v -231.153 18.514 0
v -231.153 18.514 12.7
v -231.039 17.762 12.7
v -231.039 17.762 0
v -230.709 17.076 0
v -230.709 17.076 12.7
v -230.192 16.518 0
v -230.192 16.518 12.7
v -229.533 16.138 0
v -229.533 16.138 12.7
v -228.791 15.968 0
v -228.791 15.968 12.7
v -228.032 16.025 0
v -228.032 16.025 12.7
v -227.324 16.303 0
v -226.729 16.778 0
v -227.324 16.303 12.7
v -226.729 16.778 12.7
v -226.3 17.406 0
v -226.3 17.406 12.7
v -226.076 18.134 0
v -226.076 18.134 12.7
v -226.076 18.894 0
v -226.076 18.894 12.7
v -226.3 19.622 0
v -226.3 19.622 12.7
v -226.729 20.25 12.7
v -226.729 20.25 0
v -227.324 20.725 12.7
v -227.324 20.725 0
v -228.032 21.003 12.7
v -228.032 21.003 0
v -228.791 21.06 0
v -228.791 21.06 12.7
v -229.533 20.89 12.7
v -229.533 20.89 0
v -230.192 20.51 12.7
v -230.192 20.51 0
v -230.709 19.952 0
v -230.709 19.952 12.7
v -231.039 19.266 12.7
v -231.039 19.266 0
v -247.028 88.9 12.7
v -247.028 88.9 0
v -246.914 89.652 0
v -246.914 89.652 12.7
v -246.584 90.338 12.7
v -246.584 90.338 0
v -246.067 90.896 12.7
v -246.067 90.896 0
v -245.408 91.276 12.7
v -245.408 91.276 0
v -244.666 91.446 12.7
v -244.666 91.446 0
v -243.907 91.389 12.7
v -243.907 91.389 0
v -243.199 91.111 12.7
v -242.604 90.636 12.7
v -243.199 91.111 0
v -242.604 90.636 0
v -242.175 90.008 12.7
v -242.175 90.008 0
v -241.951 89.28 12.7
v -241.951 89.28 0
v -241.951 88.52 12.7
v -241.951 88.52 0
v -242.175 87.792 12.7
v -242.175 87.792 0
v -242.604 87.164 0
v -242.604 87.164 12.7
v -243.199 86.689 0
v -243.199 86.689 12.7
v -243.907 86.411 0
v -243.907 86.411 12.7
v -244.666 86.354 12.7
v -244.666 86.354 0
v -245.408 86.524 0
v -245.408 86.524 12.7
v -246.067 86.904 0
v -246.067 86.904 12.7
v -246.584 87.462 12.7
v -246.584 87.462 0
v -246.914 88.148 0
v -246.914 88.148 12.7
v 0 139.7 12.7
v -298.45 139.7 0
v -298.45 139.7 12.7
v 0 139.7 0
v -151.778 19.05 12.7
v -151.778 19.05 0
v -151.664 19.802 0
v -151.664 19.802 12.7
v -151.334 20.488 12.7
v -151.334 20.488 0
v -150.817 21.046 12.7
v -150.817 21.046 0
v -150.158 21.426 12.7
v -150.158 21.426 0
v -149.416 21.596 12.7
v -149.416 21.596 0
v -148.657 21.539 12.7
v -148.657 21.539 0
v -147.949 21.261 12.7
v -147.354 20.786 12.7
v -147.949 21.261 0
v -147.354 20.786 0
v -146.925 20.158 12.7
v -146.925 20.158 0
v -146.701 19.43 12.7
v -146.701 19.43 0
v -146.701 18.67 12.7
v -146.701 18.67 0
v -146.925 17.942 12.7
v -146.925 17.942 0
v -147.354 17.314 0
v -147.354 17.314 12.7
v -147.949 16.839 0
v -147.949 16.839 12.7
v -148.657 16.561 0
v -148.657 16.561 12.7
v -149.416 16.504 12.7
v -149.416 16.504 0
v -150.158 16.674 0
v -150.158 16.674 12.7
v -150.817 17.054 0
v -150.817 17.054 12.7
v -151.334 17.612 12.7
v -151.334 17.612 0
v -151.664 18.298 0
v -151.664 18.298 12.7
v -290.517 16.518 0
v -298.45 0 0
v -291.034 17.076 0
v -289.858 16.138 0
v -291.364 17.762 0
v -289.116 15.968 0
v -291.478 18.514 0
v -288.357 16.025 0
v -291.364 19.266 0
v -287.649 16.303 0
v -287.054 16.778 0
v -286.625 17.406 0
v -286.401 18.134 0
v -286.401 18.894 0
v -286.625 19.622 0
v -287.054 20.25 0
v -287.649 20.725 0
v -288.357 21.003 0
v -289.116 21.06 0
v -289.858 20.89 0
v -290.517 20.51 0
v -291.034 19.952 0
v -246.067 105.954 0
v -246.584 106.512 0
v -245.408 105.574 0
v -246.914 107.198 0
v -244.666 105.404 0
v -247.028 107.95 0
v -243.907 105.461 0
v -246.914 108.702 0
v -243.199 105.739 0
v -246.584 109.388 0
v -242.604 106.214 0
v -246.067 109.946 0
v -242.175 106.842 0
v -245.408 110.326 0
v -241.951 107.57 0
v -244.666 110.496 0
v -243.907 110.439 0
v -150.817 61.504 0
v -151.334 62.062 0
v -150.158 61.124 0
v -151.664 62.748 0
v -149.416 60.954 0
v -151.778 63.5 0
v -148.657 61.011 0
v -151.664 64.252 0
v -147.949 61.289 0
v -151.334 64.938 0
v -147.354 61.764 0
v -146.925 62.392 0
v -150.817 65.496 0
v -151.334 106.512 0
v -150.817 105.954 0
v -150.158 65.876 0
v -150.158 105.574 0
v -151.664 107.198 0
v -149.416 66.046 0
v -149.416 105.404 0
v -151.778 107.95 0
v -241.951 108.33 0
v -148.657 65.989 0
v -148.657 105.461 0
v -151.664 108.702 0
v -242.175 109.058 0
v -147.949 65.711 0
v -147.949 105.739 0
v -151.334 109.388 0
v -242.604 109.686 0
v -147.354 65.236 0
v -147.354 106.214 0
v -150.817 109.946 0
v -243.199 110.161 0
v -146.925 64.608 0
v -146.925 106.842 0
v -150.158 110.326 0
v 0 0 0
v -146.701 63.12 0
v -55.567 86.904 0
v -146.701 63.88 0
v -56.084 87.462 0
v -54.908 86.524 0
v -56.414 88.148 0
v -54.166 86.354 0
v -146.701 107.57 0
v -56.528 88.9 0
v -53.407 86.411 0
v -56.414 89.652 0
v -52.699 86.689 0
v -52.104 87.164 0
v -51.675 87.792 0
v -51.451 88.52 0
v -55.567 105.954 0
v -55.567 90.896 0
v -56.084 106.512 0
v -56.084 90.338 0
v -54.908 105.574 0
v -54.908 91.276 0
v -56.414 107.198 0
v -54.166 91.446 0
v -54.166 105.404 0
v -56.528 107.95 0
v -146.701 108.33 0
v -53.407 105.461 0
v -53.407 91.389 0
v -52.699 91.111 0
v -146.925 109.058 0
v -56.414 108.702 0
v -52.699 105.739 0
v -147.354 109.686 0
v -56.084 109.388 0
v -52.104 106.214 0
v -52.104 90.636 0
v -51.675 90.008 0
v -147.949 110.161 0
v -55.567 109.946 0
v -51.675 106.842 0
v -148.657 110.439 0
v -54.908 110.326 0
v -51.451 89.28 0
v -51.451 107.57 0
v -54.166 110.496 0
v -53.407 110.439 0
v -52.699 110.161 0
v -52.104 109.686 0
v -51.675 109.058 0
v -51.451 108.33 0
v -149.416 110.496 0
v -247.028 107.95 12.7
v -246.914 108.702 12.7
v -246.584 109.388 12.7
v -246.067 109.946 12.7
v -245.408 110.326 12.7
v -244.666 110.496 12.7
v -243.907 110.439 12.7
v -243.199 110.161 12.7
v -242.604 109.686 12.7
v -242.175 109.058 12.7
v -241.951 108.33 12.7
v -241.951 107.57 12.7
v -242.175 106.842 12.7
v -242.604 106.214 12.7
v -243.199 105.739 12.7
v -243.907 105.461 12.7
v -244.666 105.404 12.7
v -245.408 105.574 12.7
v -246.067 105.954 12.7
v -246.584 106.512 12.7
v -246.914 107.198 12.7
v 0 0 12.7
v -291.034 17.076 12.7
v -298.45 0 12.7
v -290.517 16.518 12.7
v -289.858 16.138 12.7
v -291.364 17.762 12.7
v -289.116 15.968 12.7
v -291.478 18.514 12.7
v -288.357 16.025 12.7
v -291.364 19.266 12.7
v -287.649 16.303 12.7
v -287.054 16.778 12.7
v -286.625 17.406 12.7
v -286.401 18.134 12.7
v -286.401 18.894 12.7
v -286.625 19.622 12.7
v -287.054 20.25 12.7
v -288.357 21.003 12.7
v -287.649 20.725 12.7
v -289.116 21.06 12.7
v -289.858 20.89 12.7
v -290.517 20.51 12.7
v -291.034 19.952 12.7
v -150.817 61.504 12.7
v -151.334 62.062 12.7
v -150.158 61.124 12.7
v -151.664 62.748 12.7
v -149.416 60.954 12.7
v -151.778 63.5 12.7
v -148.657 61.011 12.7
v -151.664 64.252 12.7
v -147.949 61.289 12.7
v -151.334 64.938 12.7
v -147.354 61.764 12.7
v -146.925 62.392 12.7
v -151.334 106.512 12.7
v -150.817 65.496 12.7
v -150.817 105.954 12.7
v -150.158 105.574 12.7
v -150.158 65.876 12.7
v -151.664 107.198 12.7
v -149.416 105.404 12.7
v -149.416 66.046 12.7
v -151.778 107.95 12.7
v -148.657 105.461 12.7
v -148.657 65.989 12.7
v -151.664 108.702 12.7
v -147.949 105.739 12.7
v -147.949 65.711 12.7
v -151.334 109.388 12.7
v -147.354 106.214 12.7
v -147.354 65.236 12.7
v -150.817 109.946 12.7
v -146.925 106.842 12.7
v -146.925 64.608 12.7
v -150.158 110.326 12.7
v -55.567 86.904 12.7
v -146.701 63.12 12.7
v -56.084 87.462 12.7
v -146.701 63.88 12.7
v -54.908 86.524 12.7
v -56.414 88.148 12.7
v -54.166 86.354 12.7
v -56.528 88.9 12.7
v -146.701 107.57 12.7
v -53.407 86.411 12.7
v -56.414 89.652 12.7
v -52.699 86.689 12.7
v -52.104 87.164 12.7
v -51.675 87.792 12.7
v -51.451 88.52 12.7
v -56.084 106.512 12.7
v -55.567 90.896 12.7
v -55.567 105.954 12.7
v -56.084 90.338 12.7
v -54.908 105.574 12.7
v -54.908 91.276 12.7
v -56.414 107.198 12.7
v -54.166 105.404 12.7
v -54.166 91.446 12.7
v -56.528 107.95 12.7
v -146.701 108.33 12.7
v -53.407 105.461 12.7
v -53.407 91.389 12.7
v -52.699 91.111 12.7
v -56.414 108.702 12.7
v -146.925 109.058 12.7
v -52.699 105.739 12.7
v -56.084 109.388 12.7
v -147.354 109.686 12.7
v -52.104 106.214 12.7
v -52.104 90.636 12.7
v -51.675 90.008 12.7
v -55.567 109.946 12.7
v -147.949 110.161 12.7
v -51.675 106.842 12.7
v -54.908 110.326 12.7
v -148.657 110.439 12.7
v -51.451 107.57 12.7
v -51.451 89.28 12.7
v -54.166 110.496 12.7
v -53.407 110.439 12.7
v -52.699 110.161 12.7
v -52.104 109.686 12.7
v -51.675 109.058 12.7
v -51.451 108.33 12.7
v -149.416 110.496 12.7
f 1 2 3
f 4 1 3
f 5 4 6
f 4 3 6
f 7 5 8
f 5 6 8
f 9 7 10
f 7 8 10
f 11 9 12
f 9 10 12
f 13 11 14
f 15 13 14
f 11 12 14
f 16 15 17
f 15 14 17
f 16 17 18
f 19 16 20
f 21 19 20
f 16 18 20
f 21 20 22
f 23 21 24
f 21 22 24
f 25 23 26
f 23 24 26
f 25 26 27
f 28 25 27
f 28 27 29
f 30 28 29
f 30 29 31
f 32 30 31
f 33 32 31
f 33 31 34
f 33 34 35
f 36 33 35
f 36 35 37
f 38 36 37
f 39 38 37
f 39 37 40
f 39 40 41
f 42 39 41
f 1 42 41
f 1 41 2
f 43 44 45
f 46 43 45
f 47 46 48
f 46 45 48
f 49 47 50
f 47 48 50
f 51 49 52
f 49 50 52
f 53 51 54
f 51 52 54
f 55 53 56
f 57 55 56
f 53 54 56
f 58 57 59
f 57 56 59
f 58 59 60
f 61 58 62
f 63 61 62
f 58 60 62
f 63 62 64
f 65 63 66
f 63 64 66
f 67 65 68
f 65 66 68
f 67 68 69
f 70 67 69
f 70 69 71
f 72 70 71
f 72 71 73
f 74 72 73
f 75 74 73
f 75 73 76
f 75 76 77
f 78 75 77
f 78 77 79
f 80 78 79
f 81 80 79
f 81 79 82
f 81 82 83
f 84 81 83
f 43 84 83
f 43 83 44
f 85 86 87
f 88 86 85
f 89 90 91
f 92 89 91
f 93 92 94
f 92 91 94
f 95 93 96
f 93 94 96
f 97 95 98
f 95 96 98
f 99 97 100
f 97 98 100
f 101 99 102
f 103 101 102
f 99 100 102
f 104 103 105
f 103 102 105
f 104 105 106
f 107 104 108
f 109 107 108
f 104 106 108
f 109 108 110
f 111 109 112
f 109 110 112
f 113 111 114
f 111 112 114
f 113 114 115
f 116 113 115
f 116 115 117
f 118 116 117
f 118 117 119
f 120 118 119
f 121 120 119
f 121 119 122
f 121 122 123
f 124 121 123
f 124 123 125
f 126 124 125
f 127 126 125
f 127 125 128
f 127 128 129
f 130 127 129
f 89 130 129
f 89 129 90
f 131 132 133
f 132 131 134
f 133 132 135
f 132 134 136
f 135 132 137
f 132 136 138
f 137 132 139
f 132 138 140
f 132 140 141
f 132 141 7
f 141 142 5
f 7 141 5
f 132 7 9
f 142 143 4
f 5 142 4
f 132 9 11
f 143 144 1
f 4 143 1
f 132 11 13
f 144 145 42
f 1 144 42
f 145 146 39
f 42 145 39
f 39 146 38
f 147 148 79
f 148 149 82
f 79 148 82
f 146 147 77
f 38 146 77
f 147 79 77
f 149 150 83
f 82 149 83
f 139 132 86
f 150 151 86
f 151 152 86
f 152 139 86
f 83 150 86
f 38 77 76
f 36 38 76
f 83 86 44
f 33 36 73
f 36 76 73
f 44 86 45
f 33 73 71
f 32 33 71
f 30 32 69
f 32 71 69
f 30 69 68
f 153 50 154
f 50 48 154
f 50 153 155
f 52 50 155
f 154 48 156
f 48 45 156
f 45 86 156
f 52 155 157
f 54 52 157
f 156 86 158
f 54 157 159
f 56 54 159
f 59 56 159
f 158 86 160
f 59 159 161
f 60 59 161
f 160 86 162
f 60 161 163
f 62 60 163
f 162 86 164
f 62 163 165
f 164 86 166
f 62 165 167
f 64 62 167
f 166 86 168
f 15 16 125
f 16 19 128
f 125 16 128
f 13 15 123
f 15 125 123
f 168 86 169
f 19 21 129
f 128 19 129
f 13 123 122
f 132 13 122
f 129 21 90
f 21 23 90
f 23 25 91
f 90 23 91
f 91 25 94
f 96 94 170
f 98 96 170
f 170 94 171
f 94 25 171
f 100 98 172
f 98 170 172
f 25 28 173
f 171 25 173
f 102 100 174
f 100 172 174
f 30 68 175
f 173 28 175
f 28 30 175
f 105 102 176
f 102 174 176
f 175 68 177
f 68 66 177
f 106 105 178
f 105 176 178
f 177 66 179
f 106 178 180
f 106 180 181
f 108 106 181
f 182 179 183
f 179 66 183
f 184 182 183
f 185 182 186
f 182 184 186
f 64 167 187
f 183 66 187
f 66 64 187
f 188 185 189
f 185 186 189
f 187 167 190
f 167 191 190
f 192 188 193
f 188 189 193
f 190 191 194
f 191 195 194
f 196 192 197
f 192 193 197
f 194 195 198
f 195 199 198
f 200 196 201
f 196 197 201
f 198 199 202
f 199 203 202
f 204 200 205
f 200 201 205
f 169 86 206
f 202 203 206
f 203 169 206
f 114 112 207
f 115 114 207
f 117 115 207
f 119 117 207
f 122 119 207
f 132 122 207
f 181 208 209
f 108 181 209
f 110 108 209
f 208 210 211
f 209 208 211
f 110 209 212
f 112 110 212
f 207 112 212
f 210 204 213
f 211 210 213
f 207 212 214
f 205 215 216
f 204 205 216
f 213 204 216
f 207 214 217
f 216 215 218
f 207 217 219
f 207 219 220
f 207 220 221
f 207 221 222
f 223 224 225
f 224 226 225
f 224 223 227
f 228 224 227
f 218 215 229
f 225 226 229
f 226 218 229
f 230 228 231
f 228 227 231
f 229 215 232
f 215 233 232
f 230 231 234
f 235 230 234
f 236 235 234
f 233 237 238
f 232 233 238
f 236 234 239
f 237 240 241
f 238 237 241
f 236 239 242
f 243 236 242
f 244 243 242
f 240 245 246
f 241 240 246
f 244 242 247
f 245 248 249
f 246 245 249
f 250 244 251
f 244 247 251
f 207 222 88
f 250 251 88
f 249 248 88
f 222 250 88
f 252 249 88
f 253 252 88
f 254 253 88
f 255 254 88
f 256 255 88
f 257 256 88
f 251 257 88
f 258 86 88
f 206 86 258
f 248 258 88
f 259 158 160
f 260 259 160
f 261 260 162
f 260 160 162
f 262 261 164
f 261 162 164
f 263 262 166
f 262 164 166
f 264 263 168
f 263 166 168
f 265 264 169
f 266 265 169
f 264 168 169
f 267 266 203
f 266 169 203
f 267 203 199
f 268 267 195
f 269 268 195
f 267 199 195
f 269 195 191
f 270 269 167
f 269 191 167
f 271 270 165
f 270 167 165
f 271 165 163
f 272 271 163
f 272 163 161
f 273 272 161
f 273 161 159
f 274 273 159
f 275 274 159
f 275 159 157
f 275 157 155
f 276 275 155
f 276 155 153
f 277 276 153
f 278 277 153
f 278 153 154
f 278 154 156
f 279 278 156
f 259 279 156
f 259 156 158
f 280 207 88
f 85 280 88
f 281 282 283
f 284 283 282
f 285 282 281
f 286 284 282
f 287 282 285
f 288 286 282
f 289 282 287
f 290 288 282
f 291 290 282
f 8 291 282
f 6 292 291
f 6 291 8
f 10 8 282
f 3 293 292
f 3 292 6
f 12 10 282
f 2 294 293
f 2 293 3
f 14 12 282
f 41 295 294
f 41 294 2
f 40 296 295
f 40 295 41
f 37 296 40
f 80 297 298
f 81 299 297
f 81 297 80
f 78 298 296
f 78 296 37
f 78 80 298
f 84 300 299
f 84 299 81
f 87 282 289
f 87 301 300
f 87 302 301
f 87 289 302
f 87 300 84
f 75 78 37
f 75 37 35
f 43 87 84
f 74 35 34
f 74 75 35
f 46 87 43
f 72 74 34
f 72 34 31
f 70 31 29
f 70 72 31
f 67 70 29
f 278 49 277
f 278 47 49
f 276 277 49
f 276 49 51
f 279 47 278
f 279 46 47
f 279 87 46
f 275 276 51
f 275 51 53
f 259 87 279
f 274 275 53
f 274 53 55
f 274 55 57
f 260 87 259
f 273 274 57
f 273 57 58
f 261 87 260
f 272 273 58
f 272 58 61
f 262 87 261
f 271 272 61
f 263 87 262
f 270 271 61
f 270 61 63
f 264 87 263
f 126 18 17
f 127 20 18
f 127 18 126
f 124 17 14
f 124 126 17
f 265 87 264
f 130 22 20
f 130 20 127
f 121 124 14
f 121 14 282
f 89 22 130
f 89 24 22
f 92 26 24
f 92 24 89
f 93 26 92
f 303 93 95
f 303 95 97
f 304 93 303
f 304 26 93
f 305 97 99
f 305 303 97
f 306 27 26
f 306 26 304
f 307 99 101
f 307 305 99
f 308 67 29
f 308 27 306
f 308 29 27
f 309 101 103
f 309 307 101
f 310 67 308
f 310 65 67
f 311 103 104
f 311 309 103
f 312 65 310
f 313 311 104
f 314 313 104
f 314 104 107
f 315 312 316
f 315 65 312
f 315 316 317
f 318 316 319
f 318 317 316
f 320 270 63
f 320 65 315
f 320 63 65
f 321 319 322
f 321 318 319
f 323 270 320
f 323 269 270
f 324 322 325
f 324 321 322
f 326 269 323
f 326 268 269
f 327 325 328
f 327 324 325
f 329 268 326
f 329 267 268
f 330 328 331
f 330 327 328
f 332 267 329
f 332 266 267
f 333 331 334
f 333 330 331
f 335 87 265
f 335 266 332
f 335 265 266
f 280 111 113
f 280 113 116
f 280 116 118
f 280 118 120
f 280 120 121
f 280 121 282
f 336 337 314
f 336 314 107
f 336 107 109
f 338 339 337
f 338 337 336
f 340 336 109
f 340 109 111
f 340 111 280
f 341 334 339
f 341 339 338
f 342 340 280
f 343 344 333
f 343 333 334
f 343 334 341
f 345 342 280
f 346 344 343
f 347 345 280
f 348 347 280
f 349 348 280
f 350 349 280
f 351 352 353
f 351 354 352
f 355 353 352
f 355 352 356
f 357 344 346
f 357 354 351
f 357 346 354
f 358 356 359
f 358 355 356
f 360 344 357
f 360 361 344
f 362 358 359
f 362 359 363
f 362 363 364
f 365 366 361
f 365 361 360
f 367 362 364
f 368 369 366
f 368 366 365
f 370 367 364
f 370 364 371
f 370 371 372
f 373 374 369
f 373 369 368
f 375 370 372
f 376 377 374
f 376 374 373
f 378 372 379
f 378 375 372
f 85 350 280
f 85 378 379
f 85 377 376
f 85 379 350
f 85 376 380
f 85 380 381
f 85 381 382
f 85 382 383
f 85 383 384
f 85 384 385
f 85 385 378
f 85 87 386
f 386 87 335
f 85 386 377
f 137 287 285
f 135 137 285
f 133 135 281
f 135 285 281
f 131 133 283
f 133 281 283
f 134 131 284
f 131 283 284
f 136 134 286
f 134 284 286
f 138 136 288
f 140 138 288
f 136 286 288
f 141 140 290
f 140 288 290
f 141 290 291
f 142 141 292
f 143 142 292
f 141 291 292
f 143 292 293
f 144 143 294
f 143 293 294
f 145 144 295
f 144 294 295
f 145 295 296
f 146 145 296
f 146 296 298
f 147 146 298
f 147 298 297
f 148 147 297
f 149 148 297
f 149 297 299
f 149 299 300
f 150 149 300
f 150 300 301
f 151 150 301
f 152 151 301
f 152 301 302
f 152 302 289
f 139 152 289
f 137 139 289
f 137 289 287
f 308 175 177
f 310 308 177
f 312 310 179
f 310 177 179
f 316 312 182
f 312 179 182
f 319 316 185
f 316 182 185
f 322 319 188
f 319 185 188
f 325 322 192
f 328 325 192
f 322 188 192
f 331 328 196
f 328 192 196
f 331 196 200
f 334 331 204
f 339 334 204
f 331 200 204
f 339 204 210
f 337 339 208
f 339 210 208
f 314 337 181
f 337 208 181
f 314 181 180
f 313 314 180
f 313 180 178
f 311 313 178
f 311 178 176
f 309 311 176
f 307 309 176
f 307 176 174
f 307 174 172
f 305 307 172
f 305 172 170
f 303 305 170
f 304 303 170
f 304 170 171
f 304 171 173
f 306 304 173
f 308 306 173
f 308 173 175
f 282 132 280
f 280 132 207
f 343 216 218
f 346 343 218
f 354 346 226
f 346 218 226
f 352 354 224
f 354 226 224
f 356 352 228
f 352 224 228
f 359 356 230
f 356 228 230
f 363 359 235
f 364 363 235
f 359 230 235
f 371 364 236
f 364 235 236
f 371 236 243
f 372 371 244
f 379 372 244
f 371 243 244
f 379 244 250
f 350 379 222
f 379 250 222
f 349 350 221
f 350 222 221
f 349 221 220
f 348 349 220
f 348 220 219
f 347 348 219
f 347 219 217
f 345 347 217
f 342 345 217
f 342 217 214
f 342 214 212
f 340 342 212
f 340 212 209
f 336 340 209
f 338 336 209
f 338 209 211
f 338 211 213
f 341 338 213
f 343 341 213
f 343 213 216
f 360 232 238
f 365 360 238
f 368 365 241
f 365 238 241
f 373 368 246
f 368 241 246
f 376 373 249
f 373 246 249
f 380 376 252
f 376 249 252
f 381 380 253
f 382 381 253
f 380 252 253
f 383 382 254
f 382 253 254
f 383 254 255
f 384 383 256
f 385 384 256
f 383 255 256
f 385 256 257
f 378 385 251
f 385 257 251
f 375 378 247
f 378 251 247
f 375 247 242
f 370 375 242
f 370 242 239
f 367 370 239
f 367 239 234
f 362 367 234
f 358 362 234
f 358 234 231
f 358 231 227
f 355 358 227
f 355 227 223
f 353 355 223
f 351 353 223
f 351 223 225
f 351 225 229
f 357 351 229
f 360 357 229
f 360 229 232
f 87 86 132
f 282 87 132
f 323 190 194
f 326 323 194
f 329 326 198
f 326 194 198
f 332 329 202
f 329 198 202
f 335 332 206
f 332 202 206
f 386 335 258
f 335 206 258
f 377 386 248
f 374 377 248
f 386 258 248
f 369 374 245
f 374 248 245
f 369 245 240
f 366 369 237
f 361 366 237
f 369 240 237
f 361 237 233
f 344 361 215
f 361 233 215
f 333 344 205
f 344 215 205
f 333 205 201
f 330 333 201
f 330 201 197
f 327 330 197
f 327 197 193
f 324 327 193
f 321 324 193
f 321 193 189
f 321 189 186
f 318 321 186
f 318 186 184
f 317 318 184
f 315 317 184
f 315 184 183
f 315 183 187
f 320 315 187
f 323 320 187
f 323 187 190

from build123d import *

# Parameters (mm, degrees)
F0_W     = 298.45
F0_H     = 127
F0_H_2   = 12.7
F1_DEPTH = 12.7
F3_D     = 5.1054
F5_D     = 5.1054
F7_D     = 5.1054


with BuildPart() as f1:
    # F0 (on Top) → F1 (new body)
    with BuildSketch(Plane.XY):
        with Locations((-149.225, 63.5)):
            Rectangle(F0_W, F0_H)
        with Locations((-149.225, 133.35)):
            Rectangle(F0_W, F0_H_2)
    extrude(amount=F1_DEPTH)

    # F3 (through all)
    with Locations(Plane.XY.offset(12.7)):
        with Locations((-149.225, 107.95), (-149.225, 63.5), (-149.225, 19.05)):
            Hole(F3_D / 2)

    # F5 (through all)
    with Locations(Plane.XY.offset(12.7)):
        with Locations((-53.975, 88.9), (-53.975, 107.95), (-244.475, 88.9), (-244.475, 107.95)):
            Hole(F5_D / 2)

    # F7 (through all)
    with Locations(Plane(origin=(0, 0, 0), x_dir=(1, 0, 0), z_dir=(0, 0, -1))):
        with Locations((-288.925, -18.5139868408), (-228.6, -18.5139868408)):
            Hole(F7_D / 2)


solid = f1.part
